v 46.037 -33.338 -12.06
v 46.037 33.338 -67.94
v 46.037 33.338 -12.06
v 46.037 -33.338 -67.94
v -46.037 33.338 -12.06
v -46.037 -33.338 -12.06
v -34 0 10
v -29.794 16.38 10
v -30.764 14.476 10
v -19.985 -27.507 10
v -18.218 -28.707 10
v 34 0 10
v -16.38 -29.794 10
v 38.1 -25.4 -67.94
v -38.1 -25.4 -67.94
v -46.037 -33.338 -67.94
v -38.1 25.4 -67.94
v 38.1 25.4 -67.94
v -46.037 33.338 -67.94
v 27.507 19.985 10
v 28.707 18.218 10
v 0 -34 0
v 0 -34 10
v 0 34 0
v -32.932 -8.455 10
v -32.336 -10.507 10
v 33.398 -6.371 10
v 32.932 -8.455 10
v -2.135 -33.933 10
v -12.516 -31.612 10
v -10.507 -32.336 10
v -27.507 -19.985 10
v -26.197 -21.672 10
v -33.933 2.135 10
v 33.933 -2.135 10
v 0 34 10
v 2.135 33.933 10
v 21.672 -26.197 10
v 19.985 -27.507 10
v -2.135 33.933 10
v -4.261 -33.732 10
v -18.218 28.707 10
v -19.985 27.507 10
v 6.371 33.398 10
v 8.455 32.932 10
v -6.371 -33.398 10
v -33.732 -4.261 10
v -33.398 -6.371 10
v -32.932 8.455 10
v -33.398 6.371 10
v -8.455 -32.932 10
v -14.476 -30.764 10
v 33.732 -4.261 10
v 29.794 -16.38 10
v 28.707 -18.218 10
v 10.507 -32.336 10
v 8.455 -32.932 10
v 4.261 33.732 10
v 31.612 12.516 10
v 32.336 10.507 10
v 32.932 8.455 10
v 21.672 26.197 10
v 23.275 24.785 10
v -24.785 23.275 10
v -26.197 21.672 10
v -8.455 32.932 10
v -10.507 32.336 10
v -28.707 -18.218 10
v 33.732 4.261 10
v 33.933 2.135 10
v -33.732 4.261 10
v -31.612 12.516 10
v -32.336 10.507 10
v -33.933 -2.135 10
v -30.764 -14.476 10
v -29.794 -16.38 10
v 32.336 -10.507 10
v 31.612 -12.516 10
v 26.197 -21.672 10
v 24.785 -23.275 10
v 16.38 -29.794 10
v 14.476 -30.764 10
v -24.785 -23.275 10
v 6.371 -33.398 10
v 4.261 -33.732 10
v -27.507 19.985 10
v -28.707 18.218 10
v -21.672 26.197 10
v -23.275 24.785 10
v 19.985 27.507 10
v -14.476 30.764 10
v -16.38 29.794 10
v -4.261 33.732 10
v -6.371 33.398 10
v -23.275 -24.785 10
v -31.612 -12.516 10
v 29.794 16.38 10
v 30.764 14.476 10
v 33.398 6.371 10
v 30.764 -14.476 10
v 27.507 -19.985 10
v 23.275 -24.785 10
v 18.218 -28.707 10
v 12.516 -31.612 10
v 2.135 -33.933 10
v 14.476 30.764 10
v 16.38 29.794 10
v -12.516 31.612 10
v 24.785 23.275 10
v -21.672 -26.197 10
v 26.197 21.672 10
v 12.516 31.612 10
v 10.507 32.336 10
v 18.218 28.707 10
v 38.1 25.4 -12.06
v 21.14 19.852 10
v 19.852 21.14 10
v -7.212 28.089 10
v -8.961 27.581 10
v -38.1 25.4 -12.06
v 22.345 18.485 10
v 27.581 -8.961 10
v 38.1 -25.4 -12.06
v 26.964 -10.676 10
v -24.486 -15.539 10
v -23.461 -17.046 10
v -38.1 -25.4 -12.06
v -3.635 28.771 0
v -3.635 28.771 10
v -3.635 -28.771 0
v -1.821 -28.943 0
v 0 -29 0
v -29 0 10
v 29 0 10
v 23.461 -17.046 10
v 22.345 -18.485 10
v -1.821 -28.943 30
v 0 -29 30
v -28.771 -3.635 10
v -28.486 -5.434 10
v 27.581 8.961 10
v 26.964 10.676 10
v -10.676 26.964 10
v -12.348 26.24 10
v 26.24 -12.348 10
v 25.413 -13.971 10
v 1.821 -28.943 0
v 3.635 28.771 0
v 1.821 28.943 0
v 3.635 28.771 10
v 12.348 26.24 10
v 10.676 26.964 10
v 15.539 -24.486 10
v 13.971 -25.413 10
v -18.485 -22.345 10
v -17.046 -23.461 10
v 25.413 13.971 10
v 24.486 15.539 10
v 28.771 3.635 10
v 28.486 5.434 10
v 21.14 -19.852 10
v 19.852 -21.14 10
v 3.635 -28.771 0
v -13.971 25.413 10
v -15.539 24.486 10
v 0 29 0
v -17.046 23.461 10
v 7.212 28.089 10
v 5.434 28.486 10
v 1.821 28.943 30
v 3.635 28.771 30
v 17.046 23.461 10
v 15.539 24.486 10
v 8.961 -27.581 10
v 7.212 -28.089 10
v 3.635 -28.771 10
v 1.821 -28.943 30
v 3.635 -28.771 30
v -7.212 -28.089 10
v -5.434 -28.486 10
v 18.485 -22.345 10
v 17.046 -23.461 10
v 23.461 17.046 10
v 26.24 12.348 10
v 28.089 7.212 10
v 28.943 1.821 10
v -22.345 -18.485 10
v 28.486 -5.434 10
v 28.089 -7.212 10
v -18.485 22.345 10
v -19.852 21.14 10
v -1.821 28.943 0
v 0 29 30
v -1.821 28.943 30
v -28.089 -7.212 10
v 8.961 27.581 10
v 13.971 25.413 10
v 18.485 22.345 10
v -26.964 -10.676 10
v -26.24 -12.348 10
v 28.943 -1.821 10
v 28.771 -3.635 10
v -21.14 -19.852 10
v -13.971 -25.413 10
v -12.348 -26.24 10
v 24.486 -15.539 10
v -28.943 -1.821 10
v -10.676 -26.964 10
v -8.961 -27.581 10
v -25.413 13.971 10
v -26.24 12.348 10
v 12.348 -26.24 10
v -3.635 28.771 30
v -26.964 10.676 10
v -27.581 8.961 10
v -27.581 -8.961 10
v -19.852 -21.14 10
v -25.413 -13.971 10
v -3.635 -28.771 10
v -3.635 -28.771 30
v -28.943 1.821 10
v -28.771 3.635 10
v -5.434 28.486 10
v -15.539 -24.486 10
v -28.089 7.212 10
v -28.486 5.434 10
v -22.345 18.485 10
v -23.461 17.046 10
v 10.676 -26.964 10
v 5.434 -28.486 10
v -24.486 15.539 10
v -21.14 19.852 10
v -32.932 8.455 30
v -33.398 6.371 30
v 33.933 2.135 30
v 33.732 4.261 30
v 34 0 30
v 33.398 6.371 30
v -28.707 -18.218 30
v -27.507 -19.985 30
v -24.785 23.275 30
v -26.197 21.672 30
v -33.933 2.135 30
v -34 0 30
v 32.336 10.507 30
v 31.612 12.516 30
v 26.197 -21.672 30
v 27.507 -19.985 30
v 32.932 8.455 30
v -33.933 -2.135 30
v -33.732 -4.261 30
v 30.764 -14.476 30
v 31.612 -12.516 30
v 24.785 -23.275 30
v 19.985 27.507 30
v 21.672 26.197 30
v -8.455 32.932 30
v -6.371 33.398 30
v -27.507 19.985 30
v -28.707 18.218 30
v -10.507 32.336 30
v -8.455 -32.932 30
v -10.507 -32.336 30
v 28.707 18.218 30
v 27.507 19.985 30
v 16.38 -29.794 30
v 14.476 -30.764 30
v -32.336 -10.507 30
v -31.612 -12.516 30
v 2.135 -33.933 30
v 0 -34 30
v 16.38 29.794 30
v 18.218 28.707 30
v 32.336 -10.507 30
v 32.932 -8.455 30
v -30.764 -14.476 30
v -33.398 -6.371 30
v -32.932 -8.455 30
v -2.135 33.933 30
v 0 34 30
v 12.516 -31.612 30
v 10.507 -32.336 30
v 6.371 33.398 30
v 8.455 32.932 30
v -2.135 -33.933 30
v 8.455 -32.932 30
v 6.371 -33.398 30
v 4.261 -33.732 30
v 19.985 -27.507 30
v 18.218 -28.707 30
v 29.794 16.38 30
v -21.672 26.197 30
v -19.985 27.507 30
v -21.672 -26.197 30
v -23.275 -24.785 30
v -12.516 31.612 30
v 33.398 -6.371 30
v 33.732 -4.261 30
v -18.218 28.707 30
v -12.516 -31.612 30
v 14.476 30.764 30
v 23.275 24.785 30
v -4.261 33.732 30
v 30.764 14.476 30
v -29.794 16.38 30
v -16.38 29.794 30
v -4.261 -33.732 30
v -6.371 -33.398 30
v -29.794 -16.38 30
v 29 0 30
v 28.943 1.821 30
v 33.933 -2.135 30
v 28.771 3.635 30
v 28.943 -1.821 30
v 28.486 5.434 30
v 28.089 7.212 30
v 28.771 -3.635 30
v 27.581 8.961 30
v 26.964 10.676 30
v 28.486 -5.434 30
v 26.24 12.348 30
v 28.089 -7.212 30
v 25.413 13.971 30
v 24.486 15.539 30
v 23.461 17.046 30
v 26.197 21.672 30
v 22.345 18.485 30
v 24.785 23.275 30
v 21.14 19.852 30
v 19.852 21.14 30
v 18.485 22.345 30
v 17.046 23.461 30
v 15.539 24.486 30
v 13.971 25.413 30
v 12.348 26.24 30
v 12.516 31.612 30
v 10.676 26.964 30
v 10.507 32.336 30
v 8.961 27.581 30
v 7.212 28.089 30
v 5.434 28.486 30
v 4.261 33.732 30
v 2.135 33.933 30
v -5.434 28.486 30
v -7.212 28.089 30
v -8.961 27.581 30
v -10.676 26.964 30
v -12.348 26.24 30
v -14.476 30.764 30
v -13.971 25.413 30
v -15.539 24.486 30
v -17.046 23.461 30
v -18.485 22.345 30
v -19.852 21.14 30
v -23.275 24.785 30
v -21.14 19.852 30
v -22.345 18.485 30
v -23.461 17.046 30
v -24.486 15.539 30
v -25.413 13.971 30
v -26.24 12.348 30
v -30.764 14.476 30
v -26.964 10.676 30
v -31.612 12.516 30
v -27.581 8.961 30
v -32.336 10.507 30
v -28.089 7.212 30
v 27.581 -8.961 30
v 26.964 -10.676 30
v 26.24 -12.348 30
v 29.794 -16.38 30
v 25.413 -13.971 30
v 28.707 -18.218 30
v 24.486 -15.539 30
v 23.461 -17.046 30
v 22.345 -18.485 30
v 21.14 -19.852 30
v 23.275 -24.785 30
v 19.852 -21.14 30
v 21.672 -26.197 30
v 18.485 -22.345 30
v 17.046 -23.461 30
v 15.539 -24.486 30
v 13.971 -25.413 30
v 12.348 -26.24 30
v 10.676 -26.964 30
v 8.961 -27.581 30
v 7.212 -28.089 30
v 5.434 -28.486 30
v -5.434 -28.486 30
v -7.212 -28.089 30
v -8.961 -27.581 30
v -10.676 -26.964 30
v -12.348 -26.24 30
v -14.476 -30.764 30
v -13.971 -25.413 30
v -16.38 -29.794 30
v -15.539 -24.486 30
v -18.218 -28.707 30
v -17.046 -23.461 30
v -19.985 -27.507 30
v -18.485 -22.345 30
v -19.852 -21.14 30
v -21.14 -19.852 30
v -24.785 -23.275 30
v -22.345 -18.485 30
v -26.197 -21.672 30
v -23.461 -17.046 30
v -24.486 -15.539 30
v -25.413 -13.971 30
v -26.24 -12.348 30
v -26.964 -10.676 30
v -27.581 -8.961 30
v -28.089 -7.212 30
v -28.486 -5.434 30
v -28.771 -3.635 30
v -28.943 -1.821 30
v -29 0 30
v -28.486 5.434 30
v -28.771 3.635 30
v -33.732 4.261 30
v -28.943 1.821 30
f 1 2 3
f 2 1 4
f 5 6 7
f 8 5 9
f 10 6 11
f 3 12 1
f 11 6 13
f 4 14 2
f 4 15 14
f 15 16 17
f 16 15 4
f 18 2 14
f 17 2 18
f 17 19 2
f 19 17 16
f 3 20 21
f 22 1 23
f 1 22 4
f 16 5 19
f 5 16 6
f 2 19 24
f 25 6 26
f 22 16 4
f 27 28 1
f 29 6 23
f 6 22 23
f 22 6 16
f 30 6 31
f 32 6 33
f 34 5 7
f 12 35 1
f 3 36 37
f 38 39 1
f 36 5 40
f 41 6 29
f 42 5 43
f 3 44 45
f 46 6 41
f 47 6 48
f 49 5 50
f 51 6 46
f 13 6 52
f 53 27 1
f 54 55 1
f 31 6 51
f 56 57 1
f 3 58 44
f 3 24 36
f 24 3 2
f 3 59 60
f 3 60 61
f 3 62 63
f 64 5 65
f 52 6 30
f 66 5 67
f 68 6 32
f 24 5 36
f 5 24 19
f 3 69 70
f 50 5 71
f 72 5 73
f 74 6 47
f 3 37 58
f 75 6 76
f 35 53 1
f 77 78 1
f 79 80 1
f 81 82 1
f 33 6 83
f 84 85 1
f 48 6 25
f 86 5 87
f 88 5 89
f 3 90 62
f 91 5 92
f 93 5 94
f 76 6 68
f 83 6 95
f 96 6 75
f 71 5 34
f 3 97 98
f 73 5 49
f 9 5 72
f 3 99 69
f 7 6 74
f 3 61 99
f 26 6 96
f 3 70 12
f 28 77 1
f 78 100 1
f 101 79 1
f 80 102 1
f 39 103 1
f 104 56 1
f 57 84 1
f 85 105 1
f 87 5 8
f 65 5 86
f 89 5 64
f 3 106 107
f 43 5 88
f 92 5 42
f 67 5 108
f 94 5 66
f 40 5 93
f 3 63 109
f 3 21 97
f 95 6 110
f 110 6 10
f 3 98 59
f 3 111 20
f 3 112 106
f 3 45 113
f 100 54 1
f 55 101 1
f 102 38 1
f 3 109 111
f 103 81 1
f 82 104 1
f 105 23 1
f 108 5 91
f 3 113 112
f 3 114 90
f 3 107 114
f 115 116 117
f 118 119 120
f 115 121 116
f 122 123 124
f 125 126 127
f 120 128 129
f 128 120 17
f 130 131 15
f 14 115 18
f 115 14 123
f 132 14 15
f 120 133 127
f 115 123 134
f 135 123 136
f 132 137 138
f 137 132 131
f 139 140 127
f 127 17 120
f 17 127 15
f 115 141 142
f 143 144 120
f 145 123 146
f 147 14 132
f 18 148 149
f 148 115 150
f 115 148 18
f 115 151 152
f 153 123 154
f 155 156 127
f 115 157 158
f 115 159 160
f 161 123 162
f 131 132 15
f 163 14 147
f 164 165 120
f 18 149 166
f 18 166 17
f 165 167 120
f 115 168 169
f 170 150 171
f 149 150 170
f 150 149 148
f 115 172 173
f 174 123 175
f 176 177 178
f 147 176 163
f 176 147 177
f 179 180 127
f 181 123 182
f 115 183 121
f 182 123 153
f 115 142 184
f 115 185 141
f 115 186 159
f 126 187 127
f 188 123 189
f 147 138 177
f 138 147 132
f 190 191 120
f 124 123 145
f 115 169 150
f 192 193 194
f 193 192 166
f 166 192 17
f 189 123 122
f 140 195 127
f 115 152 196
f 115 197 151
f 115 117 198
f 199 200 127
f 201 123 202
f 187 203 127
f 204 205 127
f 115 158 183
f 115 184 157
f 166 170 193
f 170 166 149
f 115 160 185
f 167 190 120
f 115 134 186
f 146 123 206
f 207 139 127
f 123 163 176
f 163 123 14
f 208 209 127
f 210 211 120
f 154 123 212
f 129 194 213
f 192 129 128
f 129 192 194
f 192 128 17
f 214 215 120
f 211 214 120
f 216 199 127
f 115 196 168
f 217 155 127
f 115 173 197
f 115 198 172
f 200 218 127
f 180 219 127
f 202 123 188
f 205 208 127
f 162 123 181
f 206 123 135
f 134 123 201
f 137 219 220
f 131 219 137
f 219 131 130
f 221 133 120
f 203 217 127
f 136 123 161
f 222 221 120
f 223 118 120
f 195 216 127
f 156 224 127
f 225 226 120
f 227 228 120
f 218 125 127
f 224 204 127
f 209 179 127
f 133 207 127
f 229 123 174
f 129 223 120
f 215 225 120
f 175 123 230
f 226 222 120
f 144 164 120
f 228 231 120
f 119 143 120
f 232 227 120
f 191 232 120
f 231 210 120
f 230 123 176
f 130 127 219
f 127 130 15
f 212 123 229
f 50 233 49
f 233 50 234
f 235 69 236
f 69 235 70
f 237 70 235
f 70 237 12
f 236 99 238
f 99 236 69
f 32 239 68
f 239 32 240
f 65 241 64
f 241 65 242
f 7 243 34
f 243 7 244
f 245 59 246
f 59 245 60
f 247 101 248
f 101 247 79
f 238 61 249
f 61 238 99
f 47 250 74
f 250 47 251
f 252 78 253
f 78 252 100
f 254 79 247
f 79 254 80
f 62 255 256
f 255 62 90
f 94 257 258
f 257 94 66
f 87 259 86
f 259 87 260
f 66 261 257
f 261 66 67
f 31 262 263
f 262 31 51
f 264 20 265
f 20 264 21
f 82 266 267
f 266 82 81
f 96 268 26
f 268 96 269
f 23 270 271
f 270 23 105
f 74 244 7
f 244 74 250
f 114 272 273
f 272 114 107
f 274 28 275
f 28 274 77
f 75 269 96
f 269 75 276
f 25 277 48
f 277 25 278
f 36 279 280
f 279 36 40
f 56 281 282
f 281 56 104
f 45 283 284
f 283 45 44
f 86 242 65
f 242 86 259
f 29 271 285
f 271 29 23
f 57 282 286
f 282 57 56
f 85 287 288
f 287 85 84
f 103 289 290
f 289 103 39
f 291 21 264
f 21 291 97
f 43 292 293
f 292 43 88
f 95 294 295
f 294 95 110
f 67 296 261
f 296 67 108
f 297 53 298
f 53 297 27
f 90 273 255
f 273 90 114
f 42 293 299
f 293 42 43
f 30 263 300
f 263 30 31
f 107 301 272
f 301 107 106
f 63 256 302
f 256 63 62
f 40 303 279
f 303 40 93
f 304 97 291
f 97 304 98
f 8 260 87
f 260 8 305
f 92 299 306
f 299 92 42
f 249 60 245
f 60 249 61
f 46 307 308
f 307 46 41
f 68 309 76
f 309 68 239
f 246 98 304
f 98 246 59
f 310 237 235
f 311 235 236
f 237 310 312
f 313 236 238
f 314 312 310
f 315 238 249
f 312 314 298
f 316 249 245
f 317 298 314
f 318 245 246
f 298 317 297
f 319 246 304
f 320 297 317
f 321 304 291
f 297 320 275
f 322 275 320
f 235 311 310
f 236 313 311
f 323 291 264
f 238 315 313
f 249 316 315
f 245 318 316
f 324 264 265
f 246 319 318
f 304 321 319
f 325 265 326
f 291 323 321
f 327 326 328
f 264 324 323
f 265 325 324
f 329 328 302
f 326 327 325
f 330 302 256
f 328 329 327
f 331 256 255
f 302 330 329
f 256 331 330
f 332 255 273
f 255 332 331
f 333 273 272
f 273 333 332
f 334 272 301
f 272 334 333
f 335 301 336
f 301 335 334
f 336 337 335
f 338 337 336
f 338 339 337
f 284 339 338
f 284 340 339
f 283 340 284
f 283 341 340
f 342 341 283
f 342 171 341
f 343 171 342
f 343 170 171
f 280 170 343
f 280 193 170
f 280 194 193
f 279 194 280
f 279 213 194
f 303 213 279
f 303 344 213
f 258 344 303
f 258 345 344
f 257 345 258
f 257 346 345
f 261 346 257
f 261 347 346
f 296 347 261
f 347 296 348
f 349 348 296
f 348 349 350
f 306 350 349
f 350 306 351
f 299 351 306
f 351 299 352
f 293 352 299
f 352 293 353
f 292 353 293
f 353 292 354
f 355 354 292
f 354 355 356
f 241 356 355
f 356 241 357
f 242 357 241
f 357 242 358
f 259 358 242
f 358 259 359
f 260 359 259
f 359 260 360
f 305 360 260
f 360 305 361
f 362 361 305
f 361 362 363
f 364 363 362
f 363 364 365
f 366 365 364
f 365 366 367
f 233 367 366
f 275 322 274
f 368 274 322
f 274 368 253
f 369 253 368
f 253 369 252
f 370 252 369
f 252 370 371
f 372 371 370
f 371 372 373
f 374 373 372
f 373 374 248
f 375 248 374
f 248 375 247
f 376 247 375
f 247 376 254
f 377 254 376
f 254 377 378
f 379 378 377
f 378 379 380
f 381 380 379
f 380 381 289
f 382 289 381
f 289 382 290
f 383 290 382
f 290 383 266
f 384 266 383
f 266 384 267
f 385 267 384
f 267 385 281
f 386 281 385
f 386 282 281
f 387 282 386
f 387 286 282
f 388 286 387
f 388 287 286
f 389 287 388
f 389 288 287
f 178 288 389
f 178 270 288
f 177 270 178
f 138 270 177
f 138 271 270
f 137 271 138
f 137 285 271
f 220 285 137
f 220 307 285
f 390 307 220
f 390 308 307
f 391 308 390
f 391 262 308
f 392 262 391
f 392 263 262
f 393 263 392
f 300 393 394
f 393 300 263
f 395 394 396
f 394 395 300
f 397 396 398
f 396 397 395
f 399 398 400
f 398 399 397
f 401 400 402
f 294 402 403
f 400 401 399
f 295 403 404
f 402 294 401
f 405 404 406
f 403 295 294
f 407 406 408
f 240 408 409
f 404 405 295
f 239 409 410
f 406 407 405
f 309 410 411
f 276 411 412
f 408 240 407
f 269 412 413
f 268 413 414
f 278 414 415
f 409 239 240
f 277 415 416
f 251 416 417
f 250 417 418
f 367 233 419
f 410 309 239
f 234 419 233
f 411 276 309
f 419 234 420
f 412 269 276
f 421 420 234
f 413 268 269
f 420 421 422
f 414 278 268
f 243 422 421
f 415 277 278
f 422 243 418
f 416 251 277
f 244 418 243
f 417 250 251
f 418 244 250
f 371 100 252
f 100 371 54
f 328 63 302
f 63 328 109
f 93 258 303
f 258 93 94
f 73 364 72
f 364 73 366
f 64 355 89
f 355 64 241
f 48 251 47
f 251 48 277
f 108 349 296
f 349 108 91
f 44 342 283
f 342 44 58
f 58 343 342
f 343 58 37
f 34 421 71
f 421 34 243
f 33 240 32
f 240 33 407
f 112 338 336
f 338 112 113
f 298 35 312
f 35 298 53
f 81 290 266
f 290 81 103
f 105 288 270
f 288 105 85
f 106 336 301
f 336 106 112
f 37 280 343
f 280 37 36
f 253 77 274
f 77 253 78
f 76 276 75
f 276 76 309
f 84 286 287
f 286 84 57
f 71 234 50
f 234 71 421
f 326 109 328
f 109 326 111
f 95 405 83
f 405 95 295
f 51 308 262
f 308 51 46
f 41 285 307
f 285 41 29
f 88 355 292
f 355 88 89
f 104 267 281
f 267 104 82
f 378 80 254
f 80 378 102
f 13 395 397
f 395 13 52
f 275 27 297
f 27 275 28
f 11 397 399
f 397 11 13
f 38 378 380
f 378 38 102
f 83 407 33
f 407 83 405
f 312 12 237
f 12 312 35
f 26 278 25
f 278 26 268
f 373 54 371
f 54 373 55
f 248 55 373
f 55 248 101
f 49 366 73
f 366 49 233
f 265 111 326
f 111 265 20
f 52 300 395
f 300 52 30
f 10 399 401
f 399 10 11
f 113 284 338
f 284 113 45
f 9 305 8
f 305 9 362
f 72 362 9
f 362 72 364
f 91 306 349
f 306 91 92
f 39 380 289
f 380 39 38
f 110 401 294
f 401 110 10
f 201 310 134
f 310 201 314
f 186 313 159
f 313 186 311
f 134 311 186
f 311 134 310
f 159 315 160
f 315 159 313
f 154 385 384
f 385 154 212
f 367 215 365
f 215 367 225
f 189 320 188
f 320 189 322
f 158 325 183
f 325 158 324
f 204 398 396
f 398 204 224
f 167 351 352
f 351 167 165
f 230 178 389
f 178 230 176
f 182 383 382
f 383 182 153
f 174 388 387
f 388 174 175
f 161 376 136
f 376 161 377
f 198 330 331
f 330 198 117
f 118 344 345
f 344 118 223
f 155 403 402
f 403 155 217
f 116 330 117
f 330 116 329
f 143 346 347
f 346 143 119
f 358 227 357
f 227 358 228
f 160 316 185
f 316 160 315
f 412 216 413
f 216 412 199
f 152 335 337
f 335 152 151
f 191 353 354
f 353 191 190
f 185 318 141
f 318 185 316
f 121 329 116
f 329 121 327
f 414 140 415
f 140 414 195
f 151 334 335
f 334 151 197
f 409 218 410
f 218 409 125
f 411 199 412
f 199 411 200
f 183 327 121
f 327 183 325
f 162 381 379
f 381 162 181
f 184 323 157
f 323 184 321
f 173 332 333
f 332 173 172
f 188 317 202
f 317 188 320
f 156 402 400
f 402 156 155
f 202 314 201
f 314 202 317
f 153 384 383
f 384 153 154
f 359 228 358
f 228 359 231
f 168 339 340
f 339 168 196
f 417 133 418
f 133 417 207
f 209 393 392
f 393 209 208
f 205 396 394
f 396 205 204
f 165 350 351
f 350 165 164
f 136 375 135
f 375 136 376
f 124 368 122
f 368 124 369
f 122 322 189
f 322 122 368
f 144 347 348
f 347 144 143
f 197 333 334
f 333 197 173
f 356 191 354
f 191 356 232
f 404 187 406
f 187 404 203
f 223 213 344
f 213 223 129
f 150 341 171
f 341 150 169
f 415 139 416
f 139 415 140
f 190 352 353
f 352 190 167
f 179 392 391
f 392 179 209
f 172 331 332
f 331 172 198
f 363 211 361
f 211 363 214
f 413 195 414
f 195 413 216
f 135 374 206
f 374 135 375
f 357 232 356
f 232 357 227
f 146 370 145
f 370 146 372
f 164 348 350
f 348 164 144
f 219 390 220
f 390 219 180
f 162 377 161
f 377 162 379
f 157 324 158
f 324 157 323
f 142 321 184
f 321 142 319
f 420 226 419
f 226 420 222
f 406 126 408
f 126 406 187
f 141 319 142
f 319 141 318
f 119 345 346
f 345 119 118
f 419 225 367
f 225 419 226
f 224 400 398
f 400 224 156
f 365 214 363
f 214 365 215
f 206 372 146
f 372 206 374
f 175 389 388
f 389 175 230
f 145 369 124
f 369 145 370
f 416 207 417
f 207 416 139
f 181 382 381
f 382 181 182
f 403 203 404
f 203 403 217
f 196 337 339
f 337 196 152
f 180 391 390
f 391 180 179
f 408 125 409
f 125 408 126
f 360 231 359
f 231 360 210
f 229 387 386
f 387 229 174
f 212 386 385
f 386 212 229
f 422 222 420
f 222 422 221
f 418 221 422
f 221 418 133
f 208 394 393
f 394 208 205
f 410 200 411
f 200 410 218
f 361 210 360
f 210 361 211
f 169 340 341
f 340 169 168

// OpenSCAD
$fn=100;
CM=25.4;

HEIGHT= 10;
OUTER_DIAMETER=68;

eaves_x   =  3 * CM ;      //81.61 + hans_hak; //13;
eaves_y   =  2 * CM;      //57.24 + hans_hak; //12;16;
eaves_z  =   2.2  * CM;   // length of box

difference()
{
    hull()
    {
        #cylinder(h=HEIGHT, d=OUTER_DIAMETER);

        wall_thickness = (5/8) * CM;
        translate ([0,0, -4* HEIGHT])
        cube ([eaves_x + wall_thickness, eaves_y + wall_thickness, eaves_z], center=true);    

    }

    hull()
    {
        #cylinder(h=HEIGHT, d=OUTER_DIAMETER - 10);

        wall_thickness = (5/8) * CM;
        translate ([0,0, -4* HEIGHT])
        cube ([eaves_x , eaves_y , eaves_z], center=true);    

    }
}

translate([0,0, 10])
difference()
{
   #cylinder(h=HEIGHT * 2, d=OUTER_DIAMETER);
   #cylinder(h=HEIGHT* 4 , d=OUTER_DIAMETER - 10);
}
